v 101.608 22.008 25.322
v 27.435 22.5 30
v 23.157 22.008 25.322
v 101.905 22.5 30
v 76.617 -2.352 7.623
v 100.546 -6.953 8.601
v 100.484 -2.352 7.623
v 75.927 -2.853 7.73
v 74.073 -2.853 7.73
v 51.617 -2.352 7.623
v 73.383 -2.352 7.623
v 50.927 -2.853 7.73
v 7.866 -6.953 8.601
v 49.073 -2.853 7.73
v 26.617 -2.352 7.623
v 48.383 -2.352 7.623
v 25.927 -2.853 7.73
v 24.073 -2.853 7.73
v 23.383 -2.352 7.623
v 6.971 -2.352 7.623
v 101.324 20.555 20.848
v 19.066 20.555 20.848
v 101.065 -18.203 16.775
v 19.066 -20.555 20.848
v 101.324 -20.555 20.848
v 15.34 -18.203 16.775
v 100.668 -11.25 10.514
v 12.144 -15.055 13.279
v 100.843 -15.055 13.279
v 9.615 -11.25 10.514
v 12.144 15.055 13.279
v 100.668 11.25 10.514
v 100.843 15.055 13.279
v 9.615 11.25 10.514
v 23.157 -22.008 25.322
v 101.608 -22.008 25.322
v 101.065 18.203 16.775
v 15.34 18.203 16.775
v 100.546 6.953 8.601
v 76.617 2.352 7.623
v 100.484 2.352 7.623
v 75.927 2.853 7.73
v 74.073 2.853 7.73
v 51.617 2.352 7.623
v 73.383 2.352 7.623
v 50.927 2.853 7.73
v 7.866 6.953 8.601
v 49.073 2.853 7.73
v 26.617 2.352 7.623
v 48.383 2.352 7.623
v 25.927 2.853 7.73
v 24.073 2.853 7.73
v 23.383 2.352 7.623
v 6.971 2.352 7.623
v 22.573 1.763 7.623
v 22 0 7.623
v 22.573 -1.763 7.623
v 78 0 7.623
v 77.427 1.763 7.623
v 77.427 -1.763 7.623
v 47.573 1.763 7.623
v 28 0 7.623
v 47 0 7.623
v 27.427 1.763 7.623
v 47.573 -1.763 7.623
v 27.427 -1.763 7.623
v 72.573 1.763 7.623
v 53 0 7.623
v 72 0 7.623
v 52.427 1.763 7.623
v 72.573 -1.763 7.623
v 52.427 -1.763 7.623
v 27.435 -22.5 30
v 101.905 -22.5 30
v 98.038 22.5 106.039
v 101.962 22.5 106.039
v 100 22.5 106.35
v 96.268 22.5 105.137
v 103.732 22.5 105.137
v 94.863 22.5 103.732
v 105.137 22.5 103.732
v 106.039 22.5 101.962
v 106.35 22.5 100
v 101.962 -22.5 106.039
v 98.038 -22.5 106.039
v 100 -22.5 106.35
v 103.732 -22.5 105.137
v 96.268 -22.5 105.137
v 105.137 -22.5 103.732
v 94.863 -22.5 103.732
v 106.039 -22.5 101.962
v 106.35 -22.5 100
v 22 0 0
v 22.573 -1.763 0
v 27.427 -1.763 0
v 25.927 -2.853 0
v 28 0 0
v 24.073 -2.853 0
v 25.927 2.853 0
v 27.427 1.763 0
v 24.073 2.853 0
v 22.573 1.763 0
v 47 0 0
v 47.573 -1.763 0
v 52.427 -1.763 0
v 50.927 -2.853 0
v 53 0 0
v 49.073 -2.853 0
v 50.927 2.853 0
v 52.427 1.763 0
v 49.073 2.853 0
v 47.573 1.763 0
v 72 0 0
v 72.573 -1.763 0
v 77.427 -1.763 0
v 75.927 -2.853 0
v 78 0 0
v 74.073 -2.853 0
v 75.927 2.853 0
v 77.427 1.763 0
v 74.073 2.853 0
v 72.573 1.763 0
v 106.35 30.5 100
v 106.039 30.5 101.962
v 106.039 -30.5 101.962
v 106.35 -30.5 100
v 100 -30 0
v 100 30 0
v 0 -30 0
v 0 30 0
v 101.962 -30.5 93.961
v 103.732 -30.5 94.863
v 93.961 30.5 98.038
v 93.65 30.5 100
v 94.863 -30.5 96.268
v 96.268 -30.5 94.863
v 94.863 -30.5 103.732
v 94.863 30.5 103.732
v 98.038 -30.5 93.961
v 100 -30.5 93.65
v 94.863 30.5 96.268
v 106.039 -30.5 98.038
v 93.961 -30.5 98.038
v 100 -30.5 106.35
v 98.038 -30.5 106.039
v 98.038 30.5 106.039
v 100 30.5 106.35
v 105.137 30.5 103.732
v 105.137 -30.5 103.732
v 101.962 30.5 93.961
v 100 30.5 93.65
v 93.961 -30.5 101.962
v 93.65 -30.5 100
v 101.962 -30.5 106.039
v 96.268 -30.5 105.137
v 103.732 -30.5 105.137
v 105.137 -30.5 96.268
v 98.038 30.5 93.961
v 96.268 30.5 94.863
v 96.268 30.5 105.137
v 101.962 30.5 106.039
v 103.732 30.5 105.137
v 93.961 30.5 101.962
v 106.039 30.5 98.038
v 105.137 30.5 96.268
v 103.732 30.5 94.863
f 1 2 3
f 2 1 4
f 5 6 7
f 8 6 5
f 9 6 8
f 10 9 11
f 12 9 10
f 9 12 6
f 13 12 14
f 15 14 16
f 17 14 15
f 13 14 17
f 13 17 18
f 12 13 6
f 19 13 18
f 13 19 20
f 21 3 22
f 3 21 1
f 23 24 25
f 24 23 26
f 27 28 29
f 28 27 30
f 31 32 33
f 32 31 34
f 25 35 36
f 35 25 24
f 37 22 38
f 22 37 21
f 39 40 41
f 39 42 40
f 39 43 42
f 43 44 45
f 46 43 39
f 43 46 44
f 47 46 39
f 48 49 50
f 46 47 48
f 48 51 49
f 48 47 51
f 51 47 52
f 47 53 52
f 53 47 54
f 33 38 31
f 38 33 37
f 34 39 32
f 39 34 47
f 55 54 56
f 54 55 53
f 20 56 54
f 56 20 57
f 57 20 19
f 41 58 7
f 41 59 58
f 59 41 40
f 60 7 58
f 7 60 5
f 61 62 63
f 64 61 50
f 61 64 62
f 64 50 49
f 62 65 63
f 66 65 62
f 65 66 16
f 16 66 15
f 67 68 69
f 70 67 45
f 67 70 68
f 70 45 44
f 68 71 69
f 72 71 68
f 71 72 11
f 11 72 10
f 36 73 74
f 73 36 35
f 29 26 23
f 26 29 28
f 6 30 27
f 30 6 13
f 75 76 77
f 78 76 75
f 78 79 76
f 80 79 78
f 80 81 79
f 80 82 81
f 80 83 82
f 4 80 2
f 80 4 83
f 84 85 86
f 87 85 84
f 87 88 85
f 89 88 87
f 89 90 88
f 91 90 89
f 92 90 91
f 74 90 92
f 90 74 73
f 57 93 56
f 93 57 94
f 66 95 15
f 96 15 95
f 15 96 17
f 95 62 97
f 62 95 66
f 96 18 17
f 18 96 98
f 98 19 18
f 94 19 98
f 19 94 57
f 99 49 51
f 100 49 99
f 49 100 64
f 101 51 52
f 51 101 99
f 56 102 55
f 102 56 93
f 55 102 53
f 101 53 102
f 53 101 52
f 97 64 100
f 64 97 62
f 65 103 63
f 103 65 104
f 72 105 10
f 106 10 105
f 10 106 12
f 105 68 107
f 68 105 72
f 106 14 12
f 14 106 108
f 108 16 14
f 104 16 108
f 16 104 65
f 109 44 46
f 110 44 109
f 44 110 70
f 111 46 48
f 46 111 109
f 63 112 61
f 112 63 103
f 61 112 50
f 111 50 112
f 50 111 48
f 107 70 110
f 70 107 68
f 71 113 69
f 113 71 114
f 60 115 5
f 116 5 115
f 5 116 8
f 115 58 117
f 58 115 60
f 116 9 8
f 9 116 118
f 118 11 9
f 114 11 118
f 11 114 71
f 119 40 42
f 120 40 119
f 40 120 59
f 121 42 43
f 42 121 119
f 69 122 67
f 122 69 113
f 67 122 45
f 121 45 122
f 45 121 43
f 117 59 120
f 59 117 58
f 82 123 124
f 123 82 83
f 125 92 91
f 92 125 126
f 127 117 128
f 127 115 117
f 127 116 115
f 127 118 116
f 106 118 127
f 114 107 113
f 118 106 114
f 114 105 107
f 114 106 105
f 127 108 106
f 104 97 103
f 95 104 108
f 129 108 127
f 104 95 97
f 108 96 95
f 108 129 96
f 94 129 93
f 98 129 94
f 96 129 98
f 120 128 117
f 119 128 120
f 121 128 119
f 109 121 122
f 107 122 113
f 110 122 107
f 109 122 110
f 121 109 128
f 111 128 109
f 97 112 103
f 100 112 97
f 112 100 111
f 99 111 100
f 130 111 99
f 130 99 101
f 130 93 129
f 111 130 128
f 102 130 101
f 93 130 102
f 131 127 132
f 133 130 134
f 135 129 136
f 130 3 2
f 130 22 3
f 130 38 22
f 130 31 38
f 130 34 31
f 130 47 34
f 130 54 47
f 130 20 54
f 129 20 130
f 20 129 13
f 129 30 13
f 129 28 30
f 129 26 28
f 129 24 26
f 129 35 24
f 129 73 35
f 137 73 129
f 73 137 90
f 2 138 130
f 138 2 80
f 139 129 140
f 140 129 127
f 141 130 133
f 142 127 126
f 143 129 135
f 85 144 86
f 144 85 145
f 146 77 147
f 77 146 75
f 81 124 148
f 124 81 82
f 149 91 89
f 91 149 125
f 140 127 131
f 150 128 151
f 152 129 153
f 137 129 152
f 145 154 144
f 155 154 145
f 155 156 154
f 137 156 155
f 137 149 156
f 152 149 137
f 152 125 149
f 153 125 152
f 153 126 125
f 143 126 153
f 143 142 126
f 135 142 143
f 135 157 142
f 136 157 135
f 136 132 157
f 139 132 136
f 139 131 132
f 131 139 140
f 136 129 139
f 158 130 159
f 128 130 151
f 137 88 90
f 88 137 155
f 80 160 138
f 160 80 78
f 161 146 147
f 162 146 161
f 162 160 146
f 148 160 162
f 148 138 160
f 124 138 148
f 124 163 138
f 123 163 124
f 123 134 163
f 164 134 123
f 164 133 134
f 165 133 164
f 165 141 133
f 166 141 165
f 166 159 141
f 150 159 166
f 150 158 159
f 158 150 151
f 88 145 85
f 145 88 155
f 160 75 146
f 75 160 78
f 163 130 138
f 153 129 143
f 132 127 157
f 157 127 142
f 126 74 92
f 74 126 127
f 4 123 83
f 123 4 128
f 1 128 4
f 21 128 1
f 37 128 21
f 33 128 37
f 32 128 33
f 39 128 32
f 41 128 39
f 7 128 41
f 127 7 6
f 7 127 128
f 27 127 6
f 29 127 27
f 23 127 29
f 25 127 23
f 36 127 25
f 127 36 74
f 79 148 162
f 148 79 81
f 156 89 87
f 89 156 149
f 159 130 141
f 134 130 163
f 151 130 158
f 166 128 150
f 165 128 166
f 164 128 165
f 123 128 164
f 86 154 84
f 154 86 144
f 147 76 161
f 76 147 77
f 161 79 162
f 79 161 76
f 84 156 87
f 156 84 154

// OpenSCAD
/***********************************************************************
Name ......... : guitarHanger.scad
Description....: Wall hanger for guitars
Author ....... : Garrett Melenka
Version ...... : V1.0 2016/10/07
Licence ...... : GPL
***********************************************************************/

//width of guitar hanger
width = 60; 
//depth of guitar hanger
depth = 100;
//length of guitar hanger
length = 100;

//Measured width of guitar neck
neckWidth = 45;

//Thickness of neck holder 
neckHolderThickness = 30;

//Fillet radius
filletRadius = 12.7;

//Diameter of holes for mounting screws
screwDiameter = 6.0;
//Number of mounting screws
numberOfHoles = 3;
//Spacing between mounting screws
holeSpacing = 25;


module GuitarHanger()
{
    difference()
    {
        
    hull(){
    linear_extrude(height = width, center = true){
    polygon(points = [[0,0], [depth,0], [depth,length]]);
        
    
    }
    
    
    translate([depth,length,0]){
    cylinder(h=width+1, r=filletRadius*0.5, center = true);
    }
    }
    
    
    translate([depth*0.5+10,neckHolderThickness,0]){
    rotate([0,90,0]){
    union(){
    cylinder(h=depth+10, r = neckWidth*0.5, center = true);
    translate([0,depth*0.5, 0]){
    cube(size = [neckWidth, depth, depth], center = true);
    }
    }
    }
    }
    
    for (i = [holeSpacing:holeSpacing:holeSpacing*numberOfHoles])
    
    {
    translate([i,0,0]){
    rotate([90,0,0]){
    cylinder(h = 30, r = screwDiameter*0.5, center = true);
    }
    
    }
    }
    }
}

rotate([90,0,0])
{
GuitarHanger();
}
